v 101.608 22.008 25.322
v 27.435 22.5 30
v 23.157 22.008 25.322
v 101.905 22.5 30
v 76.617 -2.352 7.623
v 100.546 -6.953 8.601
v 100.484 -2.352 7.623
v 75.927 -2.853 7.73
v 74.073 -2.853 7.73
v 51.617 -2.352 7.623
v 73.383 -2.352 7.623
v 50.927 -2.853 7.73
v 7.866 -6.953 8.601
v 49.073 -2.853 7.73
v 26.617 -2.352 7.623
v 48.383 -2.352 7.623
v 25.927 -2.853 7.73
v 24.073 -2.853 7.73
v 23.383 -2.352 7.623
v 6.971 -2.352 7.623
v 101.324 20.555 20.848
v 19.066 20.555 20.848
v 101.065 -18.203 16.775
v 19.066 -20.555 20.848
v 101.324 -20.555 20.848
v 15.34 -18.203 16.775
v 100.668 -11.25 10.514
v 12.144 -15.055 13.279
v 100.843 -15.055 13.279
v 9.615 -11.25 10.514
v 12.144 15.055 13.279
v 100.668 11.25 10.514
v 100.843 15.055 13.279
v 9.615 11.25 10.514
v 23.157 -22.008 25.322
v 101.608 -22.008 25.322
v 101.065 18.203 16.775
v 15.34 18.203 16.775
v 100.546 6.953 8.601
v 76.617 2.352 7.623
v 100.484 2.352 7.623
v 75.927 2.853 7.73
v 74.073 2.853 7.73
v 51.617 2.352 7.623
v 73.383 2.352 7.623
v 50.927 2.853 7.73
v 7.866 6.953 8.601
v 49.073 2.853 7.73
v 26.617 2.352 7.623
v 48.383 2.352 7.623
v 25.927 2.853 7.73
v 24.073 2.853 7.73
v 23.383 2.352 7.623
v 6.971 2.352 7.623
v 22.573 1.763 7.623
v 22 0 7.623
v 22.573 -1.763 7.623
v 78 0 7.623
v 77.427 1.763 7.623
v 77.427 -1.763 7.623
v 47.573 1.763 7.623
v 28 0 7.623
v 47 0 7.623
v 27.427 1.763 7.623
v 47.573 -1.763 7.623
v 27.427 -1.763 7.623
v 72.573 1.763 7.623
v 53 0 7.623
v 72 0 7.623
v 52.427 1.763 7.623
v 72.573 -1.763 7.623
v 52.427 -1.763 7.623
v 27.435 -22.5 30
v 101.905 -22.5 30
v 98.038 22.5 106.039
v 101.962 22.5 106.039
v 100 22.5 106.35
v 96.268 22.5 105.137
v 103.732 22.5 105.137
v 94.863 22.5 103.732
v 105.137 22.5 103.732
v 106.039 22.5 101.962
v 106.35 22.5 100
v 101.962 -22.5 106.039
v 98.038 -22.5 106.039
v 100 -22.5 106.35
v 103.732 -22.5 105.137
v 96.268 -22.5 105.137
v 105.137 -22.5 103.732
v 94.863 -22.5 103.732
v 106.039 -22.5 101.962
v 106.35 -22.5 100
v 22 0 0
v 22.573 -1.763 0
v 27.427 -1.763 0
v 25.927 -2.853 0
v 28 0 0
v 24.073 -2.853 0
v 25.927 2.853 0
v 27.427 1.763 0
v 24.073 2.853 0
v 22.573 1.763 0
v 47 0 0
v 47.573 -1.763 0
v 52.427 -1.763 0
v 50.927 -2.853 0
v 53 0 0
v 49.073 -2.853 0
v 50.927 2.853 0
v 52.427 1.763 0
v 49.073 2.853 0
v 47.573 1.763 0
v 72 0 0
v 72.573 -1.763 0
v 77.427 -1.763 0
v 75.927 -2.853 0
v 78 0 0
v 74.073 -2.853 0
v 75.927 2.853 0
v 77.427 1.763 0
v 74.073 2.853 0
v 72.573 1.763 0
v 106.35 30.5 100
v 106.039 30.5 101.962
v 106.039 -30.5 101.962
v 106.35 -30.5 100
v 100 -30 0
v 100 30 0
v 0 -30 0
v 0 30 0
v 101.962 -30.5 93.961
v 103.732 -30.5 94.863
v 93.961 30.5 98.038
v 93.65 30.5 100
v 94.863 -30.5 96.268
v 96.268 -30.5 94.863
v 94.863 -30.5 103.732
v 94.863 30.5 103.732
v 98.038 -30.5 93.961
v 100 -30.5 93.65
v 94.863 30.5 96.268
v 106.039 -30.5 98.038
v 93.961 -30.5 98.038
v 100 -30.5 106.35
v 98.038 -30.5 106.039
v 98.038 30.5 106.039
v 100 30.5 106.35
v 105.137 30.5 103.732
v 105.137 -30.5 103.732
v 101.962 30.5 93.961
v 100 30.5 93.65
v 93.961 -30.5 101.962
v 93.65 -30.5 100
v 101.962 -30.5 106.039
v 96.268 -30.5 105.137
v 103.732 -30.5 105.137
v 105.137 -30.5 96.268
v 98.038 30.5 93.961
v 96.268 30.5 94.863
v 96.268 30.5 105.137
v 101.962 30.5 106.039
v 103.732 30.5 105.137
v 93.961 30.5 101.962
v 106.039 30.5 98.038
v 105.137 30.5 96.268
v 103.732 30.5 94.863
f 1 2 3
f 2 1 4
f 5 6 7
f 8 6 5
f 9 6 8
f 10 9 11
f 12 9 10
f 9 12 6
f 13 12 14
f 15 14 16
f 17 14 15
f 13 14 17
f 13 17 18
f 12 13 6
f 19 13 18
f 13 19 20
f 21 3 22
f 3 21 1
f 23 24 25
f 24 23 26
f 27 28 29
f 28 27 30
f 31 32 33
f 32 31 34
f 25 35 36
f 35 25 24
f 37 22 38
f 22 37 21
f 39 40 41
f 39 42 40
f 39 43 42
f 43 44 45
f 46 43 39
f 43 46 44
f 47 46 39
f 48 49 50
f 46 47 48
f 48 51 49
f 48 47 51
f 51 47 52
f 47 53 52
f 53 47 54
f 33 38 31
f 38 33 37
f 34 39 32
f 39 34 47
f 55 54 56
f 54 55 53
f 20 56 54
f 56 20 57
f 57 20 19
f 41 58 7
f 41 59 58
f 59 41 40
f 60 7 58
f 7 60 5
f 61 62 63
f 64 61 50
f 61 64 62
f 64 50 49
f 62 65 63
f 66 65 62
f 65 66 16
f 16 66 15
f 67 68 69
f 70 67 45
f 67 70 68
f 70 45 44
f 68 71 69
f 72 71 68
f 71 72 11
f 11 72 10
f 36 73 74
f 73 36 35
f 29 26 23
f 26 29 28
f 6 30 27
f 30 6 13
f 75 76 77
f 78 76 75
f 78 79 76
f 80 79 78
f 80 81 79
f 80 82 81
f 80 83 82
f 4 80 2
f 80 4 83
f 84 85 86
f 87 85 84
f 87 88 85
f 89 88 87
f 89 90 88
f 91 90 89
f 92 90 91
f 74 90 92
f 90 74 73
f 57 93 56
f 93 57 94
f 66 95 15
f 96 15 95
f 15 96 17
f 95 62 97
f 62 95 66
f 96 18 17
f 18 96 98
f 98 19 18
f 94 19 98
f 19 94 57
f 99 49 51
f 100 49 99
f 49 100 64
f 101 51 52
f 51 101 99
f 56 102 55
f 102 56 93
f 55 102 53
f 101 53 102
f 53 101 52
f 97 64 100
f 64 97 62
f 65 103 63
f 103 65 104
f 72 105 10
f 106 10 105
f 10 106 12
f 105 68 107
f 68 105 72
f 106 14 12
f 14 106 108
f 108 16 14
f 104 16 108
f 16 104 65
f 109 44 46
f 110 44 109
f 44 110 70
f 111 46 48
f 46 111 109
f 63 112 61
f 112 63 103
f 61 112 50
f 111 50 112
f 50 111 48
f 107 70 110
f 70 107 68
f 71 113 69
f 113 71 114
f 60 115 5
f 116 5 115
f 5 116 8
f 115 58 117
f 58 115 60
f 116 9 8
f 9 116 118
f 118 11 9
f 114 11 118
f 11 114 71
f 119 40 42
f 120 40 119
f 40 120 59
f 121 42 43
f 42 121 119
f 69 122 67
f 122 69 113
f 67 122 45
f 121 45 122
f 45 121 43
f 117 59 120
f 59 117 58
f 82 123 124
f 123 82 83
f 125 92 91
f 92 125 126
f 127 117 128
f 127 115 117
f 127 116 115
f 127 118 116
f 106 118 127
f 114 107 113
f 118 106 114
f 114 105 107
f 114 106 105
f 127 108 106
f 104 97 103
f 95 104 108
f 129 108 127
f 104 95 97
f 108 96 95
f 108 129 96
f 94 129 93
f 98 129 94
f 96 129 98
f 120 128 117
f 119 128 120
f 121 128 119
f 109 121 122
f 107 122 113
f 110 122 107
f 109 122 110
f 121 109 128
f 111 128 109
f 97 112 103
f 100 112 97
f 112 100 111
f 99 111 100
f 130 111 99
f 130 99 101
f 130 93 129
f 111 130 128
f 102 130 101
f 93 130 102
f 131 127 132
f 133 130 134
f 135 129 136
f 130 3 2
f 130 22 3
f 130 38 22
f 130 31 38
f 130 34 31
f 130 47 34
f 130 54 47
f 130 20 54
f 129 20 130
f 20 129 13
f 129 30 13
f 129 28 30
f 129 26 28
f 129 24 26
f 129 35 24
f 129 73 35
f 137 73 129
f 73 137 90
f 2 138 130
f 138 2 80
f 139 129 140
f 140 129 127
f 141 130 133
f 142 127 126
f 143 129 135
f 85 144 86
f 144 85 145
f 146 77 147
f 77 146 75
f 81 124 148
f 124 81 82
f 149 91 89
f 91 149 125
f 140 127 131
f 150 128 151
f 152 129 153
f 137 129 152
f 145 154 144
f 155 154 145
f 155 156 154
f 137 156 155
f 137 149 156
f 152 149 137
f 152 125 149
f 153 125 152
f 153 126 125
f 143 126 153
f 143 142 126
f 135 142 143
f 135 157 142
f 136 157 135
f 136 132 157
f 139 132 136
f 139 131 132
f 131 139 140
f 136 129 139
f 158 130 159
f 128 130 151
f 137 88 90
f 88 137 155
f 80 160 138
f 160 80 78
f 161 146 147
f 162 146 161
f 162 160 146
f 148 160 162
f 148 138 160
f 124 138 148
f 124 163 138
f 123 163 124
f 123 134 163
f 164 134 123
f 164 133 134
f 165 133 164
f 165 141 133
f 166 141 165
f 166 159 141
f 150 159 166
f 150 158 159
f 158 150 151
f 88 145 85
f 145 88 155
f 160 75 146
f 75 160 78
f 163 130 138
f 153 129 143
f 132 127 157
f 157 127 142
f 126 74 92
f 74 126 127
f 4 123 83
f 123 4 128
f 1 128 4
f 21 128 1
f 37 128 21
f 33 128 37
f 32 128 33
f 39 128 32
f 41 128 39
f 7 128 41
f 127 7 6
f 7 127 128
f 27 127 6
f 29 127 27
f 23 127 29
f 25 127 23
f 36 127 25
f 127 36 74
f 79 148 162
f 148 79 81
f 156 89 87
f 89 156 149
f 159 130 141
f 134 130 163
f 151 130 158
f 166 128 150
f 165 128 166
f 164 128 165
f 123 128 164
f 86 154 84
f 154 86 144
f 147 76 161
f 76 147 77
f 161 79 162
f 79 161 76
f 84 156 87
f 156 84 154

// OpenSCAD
/***********************************************************************
Name ......... : guitarHanger.scad
Description....: Wall hanger for guitars
Author ....... : Garrett Melenka
Version ...... : V1.0 2016/10/07
Licence ...... : GPL
***********************************************************************/

//width of guitar hanger
width = 60; 
//depth of guitar hanger
depth = 100;
//length of guitar hanger
length = 100;

//Measured width of guitar neck
neckWidth = 45;

//Thickness of neck holder 
neckHolderThickness = 30;

//Fillet radius
filletRadius = 12.7;

//Diameter of holes for mounting screws
screwDiameter = 6.0;
//Number of mounting screws
numberOfHoles = 3;
//Spacing between mounting screws
holeSpacing = 25;


module GuitarHanger()
{
    difference()
    {
        
    hull(){
    linear_extrude(height = width, center = true){
    polygon(points = [[0,0], [depth,0], [depth,length]]);
        
    
    }
    
    
    translate([depth,length,0]){
    cylinder(h=width+1, r=filletRadius*0.5, center = true);
    }
    }
    
    
    translate([depth*0.5+10,neckHolderThickness,0]){
    rotate([0,90,0]){
    union(){
    cylinder(h=depth+10, r = neckWidth*0.5, center = true);
    translate([0,depth*0.5, 0]){
    cube(size = [neckWidth, depth, depth], center = true);
    }
    }
    }
    }
    
    for (i = [holeSpacing:holeSpacing:holeSpacing*numberOfHoles])
    
    {
    translate([i,0,0]){
    rotate([90,0,0]){
    cylinder(h = 30, r = screwDiameter*0.5, center = true);
    }
    
    }
    }
    }
}

rotate([90,0,0])
{
GuitarHanger();
}
